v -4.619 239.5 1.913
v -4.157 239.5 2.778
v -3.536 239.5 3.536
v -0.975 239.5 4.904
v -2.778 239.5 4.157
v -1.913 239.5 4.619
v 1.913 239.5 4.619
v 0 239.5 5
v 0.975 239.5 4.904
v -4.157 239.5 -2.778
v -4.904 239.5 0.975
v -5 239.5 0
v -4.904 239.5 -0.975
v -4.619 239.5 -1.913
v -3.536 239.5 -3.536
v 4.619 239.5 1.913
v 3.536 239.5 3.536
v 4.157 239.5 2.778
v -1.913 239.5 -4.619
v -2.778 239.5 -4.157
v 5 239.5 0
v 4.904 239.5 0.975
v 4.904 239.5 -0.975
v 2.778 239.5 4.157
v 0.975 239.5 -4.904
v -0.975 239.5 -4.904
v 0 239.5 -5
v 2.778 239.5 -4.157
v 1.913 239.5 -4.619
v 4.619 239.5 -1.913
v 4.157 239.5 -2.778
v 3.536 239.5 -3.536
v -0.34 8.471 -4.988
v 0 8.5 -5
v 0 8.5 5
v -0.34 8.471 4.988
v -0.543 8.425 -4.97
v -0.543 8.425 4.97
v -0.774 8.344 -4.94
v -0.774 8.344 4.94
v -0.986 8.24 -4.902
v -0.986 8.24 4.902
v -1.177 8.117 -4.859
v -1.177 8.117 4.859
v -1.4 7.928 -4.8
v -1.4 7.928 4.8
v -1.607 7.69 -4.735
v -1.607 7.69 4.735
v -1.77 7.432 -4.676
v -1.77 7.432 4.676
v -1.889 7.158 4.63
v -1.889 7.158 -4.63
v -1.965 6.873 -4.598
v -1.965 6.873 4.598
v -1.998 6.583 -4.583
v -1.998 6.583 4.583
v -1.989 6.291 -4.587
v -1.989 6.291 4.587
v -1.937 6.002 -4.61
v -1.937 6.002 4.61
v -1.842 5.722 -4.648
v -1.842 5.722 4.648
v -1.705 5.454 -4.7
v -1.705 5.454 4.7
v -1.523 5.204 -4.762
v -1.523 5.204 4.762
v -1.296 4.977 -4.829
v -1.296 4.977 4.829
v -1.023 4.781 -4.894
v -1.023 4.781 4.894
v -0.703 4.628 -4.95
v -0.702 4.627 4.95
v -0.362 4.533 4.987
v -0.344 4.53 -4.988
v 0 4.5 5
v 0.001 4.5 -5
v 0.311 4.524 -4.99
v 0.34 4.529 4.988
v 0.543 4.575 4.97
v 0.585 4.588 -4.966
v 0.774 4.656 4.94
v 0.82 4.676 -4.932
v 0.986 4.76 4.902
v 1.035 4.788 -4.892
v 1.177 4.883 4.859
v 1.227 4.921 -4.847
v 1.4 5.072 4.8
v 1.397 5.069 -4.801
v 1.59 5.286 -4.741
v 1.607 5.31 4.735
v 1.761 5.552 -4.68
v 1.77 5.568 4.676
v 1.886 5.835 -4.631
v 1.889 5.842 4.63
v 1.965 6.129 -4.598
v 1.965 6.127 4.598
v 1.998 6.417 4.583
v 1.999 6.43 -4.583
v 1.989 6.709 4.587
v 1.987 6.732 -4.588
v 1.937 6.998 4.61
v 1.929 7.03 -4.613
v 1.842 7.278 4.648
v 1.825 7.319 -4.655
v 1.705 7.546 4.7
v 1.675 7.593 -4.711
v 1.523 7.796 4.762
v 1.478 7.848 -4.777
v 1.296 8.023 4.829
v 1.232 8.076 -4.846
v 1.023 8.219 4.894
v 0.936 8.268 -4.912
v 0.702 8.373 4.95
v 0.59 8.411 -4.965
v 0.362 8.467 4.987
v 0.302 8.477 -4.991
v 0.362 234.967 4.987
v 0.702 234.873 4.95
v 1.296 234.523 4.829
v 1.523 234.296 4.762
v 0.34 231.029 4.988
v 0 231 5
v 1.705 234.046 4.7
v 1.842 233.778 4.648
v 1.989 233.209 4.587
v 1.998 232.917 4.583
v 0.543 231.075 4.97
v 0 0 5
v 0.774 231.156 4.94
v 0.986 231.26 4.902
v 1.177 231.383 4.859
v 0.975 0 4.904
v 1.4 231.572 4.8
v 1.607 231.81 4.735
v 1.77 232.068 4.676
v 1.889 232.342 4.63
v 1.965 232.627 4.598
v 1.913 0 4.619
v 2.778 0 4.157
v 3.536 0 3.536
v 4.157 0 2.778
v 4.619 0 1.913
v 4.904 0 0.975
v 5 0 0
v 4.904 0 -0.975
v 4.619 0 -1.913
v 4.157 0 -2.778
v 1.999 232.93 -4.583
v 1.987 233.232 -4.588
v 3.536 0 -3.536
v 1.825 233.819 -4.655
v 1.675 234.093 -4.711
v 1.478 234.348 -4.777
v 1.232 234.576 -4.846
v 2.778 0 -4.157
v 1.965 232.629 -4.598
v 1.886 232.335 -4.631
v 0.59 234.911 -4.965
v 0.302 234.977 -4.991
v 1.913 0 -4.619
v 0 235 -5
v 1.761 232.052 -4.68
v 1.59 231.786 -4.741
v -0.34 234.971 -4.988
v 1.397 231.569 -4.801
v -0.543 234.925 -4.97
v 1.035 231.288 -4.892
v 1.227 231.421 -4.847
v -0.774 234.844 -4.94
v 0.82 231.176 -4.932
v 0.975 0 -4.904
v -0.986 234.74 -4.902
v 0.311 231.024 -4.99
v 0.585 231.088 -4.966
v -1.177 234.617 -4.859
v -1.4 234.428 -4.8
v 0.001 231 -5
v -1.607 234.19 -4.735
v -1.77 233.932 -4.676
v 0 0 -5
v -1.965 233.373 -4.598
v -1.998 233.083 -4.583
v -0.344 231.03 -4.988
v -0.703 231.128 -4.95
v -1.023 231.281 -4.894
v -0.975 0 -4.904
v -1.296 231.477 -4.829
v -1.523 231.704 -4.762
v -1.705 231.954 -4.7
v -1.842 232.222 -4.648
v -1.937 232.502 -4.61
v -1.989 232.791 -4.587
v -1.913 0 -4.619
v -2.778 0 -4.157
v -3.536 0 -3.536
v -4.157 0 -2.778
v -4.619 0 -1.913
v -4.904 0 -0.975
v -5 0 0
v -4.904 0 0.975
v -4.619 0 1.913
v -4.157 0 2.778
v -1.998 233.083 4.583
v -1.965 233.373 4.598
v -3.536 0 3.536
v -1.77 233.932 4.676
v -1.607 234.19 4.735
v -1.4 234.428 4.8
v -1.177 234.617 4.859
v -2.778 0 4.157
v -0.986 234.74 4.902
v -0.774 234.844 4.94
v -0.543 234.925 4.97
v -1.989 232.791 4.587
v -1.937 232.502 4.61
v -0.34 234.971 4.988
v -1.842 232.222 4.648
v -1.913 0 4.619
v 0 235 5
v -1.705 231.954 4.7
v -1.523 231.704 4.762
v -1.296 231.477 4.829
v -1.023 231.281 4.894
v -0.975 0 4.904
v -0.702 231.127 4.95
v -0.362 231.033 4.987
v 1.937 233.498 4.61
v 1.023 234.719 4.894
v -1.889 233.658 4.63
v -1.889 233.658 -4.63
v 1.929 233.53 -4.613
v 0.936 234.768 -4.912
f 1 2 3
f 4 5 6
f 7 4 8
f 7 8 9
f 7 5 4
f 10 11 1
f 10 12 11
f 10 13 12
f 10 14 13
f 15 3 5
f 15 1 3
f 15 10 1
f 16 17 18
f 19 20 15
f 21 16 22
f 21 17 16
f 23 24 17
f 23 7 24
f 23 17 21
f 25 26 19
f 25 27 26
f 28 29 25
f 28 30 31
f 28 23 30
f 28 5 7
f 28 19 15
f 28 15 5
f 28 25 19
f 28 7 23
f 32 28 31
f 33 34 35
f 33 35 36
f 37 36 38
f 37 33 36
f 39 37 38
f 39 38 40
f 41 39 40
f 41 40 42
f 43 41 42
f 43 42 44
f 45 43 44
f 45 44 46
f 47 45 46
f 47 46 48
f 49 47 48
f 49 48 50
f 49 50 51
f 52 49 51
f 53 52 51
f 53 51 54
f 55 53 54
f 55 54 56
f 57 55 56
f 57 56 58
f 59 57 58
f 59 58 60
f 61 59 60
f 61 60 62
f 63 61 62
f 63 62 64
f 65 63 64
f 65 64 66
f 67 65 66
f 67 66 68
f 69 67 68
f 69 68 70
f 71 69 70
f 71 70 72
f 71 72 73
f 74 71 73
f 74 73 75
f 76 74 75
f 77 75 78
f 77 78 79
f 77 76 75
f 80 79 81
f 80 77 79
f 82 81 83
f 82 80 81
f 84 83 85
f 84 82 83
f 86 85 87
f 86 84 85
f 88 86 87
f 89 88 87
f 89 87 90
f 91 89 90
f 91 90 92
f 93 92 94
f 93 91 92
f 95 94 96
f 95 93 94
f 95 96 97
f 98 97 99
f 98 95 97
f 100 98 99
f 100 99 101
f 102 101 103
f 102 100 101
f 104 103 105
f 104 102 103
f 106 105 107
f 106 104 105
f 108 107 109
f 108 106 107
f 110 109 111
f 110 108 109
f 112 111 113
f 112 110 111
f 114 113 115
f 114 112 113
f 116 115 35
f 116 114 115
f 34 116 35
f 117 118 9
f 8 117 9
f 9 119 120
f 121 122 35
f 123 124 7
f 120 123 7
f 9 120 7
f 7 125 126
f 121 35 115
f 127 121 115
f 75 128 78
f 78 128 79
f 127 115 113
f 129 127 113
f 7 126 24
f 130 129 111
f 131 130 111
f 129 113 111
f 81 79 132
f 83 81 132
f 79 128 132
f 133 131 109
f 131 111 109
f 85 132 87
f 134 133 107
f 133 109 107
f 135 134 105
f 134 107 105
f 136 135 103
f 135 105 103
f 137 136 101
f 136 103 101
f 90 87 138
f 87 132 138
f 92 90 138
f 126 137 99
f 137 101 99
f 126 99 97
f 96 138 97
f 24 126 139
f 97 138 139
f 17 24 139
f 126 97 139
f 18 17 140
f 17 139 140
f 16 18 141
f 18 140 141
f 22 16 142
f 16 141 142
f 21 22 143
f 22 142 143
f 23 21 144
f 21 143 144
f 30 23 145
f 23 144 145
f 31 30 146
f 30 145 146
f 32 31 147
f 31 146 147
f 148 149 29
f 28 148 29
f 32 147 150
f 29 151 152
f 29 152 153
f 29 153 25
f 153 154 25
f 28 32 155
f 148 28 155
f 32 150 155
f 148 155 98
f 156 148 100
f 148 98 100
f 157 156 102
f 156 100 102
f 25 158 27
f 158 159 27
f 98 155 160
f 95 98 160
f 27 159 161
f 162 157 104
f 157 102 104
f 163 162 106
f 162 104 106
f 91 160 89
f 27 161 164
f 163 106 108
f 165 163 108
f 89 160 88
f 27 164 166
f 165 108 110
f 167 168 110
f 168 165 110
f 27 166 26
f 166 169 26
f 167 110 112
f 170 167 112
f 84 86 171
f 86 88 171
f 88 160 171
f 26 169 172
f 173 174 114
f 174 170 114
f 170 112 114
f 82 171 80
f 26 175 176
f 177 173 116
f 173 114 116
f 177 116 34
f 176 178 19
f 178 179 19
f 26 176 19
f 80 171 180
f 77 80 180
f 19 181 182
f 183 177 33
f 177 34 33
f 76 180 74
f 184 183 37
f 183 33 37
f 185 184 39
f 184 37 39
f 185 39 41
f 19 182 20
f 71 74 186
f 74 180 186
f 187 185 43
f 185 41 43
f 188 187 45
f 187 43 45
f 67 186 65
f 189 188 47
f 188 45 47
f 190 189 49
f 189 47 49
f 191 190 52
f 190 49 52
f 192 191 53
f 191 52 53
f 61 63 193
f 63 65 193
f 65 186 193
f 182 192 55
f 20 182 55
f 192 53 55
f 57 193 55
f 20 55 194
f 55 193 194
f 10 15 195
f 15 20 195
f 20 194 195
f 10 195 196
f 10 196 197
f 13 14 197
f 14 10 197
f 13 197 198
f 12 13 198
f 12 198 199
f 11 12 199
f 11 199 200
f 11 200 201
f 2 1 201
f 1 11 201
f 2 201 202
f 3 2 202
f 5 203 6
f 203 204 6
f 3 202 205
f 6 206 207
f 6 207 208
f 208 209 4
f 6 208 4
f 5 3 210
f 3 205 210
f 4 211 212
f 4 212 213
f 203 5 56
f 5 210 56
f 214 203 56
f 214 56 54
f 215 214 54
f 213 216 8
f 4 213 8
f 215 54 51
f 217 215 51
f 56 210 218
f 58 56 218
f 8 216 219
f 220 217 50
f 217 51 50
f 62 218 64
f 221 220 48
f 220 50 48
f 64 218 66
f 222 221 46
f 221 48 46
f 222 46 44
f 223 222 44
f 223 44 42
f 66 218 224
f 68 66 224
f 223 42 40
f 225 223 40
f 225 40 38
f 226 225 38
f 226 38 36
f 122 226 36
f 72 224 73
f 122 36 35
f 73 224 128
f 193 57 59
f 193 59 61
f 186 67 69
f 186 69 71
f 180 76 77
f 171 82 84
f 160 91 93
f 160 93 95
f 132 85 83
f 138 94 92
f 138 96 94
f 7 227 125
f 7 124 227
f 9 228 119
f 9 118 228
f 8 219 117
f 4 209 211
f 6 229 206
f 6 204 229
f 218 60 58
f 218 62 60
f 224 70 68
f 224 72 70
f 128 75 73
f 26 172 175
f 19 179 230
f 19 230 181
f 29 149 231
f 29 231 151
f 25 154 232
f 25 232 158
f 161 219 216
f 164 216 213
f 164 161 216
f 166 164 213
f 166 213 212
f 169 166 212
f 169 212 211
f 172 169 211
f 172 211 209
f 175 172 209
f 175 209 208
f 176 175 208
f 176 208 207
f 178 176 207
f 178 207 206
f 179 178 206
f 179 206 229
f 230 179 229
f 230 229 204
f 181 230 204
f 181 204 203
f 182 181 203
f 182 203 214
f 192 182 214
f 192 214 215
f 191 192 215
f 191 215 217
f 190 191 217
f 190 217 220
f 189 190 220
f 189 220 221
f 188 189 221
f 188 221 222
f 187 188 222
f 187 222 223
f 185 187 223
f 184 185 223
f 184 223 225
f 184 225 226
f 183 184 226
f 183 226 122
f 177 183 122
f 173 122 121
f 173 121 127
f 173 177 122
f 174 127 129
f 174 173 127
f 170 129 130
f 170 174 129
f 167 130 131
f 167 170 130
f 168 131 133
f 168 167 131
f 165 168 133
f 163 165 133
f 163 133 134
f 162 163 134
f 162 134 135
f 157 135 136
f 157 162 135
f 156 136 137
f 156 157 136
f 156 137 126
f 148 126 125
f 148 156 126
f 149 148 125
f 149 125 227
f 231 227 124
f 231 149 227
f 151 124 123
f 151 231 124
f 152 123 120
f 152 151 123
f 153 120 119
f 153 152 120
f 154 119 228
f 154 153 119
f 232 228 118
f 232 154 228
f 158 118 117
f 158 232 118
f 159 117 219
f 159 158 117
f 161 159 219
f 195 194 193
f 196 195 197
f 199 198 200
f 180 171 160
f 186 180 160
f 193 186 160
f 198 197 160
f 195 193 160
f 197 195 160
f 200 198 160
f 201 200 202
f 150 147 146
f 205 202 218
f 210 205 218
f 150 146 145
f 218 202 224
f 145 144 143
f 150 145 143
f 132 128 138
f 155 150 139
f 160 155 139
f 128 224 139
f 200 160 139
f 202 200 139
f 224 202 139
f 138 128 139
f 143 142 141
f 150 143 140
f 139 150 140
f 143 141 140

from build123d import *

# Parameters (mm, degrees)
CROQUIS1_R                 = 5
SALIENTE_EXTRUIR1_DEPTH    = 339
CROQUIS2_R                 = 6.894742802
CORTAR_EXTRUIR1_DEPTH      = 99.5
CORTAR_EXTRUIR2_DEPTH      = 10
CORTAR_EXTRUIR2_DEPTH_BACK = 10
CROQUIS3_R                 = 2
CORTAR_EXTRUIR3_DEPTH      = 10
CORTAR_EXTRUIR3_DEPTH_BACK = 10
CROQUIS4_R                 = 2


with BuildPart() as part:
    # Croquis1 → Saliente-Extruir1 (new body)
    with BuildSketch(Plane(origin=(0, 0, 0), x_dir=(1, 0, 0), z_dir=(0, 1, 0))):
        Circle(CROQUIS1_R)
    extrude(amount=SALIENTE_EXTRUIR1_DEPTH)

    # Croquis2 → Cortar-Extruir1 (cut)
    with BuildSketch(Plane(origin=(0, 339, 0), x_dir=(1, 0, 0), z_dir=(0, 1, 0))):
        Circle(CROQUIS2_R)
    extrude(amount=-CORTAR_EXTRUIR1_DEPTH, mode=Mode.SUBTRACT)

    # Croquis3 → Cortar-Extruir2 (cut, two sides: drawn at the far end of the back side and taken through both)
    with BuildSketch(Plane.XY.offset(-CORTAR_EXTRUIR2_DEPTH_BACK)):
        with Locations((0, 6.5)):
            Circle(CROQUIS3_R)
    extrude(amount=CORTAR_EXTRUIR2_DEPTH + CORTAR_EXTRUIR2_DEPTH_BACK, mode=Mode.SUBTRACT)

    # Croquis4 → Cortar-Extruir3 (cut, two sides: drawn at the far end of the back side and taken through both)
    with BuildSketch(Plane.XY.offset(-CORTAR_EXTRUIR3_DEPTH_BACK)):
        with Locations((0, 233)):
            Circle(CROQUIS4_R)
    extrude(amount=CORTAR_EXTRUIR3_DEPTH + CORTAR_EXTRUIR3_DEPTH_BACK, mode=Mode.SUBTRACT)


solid = part.part
